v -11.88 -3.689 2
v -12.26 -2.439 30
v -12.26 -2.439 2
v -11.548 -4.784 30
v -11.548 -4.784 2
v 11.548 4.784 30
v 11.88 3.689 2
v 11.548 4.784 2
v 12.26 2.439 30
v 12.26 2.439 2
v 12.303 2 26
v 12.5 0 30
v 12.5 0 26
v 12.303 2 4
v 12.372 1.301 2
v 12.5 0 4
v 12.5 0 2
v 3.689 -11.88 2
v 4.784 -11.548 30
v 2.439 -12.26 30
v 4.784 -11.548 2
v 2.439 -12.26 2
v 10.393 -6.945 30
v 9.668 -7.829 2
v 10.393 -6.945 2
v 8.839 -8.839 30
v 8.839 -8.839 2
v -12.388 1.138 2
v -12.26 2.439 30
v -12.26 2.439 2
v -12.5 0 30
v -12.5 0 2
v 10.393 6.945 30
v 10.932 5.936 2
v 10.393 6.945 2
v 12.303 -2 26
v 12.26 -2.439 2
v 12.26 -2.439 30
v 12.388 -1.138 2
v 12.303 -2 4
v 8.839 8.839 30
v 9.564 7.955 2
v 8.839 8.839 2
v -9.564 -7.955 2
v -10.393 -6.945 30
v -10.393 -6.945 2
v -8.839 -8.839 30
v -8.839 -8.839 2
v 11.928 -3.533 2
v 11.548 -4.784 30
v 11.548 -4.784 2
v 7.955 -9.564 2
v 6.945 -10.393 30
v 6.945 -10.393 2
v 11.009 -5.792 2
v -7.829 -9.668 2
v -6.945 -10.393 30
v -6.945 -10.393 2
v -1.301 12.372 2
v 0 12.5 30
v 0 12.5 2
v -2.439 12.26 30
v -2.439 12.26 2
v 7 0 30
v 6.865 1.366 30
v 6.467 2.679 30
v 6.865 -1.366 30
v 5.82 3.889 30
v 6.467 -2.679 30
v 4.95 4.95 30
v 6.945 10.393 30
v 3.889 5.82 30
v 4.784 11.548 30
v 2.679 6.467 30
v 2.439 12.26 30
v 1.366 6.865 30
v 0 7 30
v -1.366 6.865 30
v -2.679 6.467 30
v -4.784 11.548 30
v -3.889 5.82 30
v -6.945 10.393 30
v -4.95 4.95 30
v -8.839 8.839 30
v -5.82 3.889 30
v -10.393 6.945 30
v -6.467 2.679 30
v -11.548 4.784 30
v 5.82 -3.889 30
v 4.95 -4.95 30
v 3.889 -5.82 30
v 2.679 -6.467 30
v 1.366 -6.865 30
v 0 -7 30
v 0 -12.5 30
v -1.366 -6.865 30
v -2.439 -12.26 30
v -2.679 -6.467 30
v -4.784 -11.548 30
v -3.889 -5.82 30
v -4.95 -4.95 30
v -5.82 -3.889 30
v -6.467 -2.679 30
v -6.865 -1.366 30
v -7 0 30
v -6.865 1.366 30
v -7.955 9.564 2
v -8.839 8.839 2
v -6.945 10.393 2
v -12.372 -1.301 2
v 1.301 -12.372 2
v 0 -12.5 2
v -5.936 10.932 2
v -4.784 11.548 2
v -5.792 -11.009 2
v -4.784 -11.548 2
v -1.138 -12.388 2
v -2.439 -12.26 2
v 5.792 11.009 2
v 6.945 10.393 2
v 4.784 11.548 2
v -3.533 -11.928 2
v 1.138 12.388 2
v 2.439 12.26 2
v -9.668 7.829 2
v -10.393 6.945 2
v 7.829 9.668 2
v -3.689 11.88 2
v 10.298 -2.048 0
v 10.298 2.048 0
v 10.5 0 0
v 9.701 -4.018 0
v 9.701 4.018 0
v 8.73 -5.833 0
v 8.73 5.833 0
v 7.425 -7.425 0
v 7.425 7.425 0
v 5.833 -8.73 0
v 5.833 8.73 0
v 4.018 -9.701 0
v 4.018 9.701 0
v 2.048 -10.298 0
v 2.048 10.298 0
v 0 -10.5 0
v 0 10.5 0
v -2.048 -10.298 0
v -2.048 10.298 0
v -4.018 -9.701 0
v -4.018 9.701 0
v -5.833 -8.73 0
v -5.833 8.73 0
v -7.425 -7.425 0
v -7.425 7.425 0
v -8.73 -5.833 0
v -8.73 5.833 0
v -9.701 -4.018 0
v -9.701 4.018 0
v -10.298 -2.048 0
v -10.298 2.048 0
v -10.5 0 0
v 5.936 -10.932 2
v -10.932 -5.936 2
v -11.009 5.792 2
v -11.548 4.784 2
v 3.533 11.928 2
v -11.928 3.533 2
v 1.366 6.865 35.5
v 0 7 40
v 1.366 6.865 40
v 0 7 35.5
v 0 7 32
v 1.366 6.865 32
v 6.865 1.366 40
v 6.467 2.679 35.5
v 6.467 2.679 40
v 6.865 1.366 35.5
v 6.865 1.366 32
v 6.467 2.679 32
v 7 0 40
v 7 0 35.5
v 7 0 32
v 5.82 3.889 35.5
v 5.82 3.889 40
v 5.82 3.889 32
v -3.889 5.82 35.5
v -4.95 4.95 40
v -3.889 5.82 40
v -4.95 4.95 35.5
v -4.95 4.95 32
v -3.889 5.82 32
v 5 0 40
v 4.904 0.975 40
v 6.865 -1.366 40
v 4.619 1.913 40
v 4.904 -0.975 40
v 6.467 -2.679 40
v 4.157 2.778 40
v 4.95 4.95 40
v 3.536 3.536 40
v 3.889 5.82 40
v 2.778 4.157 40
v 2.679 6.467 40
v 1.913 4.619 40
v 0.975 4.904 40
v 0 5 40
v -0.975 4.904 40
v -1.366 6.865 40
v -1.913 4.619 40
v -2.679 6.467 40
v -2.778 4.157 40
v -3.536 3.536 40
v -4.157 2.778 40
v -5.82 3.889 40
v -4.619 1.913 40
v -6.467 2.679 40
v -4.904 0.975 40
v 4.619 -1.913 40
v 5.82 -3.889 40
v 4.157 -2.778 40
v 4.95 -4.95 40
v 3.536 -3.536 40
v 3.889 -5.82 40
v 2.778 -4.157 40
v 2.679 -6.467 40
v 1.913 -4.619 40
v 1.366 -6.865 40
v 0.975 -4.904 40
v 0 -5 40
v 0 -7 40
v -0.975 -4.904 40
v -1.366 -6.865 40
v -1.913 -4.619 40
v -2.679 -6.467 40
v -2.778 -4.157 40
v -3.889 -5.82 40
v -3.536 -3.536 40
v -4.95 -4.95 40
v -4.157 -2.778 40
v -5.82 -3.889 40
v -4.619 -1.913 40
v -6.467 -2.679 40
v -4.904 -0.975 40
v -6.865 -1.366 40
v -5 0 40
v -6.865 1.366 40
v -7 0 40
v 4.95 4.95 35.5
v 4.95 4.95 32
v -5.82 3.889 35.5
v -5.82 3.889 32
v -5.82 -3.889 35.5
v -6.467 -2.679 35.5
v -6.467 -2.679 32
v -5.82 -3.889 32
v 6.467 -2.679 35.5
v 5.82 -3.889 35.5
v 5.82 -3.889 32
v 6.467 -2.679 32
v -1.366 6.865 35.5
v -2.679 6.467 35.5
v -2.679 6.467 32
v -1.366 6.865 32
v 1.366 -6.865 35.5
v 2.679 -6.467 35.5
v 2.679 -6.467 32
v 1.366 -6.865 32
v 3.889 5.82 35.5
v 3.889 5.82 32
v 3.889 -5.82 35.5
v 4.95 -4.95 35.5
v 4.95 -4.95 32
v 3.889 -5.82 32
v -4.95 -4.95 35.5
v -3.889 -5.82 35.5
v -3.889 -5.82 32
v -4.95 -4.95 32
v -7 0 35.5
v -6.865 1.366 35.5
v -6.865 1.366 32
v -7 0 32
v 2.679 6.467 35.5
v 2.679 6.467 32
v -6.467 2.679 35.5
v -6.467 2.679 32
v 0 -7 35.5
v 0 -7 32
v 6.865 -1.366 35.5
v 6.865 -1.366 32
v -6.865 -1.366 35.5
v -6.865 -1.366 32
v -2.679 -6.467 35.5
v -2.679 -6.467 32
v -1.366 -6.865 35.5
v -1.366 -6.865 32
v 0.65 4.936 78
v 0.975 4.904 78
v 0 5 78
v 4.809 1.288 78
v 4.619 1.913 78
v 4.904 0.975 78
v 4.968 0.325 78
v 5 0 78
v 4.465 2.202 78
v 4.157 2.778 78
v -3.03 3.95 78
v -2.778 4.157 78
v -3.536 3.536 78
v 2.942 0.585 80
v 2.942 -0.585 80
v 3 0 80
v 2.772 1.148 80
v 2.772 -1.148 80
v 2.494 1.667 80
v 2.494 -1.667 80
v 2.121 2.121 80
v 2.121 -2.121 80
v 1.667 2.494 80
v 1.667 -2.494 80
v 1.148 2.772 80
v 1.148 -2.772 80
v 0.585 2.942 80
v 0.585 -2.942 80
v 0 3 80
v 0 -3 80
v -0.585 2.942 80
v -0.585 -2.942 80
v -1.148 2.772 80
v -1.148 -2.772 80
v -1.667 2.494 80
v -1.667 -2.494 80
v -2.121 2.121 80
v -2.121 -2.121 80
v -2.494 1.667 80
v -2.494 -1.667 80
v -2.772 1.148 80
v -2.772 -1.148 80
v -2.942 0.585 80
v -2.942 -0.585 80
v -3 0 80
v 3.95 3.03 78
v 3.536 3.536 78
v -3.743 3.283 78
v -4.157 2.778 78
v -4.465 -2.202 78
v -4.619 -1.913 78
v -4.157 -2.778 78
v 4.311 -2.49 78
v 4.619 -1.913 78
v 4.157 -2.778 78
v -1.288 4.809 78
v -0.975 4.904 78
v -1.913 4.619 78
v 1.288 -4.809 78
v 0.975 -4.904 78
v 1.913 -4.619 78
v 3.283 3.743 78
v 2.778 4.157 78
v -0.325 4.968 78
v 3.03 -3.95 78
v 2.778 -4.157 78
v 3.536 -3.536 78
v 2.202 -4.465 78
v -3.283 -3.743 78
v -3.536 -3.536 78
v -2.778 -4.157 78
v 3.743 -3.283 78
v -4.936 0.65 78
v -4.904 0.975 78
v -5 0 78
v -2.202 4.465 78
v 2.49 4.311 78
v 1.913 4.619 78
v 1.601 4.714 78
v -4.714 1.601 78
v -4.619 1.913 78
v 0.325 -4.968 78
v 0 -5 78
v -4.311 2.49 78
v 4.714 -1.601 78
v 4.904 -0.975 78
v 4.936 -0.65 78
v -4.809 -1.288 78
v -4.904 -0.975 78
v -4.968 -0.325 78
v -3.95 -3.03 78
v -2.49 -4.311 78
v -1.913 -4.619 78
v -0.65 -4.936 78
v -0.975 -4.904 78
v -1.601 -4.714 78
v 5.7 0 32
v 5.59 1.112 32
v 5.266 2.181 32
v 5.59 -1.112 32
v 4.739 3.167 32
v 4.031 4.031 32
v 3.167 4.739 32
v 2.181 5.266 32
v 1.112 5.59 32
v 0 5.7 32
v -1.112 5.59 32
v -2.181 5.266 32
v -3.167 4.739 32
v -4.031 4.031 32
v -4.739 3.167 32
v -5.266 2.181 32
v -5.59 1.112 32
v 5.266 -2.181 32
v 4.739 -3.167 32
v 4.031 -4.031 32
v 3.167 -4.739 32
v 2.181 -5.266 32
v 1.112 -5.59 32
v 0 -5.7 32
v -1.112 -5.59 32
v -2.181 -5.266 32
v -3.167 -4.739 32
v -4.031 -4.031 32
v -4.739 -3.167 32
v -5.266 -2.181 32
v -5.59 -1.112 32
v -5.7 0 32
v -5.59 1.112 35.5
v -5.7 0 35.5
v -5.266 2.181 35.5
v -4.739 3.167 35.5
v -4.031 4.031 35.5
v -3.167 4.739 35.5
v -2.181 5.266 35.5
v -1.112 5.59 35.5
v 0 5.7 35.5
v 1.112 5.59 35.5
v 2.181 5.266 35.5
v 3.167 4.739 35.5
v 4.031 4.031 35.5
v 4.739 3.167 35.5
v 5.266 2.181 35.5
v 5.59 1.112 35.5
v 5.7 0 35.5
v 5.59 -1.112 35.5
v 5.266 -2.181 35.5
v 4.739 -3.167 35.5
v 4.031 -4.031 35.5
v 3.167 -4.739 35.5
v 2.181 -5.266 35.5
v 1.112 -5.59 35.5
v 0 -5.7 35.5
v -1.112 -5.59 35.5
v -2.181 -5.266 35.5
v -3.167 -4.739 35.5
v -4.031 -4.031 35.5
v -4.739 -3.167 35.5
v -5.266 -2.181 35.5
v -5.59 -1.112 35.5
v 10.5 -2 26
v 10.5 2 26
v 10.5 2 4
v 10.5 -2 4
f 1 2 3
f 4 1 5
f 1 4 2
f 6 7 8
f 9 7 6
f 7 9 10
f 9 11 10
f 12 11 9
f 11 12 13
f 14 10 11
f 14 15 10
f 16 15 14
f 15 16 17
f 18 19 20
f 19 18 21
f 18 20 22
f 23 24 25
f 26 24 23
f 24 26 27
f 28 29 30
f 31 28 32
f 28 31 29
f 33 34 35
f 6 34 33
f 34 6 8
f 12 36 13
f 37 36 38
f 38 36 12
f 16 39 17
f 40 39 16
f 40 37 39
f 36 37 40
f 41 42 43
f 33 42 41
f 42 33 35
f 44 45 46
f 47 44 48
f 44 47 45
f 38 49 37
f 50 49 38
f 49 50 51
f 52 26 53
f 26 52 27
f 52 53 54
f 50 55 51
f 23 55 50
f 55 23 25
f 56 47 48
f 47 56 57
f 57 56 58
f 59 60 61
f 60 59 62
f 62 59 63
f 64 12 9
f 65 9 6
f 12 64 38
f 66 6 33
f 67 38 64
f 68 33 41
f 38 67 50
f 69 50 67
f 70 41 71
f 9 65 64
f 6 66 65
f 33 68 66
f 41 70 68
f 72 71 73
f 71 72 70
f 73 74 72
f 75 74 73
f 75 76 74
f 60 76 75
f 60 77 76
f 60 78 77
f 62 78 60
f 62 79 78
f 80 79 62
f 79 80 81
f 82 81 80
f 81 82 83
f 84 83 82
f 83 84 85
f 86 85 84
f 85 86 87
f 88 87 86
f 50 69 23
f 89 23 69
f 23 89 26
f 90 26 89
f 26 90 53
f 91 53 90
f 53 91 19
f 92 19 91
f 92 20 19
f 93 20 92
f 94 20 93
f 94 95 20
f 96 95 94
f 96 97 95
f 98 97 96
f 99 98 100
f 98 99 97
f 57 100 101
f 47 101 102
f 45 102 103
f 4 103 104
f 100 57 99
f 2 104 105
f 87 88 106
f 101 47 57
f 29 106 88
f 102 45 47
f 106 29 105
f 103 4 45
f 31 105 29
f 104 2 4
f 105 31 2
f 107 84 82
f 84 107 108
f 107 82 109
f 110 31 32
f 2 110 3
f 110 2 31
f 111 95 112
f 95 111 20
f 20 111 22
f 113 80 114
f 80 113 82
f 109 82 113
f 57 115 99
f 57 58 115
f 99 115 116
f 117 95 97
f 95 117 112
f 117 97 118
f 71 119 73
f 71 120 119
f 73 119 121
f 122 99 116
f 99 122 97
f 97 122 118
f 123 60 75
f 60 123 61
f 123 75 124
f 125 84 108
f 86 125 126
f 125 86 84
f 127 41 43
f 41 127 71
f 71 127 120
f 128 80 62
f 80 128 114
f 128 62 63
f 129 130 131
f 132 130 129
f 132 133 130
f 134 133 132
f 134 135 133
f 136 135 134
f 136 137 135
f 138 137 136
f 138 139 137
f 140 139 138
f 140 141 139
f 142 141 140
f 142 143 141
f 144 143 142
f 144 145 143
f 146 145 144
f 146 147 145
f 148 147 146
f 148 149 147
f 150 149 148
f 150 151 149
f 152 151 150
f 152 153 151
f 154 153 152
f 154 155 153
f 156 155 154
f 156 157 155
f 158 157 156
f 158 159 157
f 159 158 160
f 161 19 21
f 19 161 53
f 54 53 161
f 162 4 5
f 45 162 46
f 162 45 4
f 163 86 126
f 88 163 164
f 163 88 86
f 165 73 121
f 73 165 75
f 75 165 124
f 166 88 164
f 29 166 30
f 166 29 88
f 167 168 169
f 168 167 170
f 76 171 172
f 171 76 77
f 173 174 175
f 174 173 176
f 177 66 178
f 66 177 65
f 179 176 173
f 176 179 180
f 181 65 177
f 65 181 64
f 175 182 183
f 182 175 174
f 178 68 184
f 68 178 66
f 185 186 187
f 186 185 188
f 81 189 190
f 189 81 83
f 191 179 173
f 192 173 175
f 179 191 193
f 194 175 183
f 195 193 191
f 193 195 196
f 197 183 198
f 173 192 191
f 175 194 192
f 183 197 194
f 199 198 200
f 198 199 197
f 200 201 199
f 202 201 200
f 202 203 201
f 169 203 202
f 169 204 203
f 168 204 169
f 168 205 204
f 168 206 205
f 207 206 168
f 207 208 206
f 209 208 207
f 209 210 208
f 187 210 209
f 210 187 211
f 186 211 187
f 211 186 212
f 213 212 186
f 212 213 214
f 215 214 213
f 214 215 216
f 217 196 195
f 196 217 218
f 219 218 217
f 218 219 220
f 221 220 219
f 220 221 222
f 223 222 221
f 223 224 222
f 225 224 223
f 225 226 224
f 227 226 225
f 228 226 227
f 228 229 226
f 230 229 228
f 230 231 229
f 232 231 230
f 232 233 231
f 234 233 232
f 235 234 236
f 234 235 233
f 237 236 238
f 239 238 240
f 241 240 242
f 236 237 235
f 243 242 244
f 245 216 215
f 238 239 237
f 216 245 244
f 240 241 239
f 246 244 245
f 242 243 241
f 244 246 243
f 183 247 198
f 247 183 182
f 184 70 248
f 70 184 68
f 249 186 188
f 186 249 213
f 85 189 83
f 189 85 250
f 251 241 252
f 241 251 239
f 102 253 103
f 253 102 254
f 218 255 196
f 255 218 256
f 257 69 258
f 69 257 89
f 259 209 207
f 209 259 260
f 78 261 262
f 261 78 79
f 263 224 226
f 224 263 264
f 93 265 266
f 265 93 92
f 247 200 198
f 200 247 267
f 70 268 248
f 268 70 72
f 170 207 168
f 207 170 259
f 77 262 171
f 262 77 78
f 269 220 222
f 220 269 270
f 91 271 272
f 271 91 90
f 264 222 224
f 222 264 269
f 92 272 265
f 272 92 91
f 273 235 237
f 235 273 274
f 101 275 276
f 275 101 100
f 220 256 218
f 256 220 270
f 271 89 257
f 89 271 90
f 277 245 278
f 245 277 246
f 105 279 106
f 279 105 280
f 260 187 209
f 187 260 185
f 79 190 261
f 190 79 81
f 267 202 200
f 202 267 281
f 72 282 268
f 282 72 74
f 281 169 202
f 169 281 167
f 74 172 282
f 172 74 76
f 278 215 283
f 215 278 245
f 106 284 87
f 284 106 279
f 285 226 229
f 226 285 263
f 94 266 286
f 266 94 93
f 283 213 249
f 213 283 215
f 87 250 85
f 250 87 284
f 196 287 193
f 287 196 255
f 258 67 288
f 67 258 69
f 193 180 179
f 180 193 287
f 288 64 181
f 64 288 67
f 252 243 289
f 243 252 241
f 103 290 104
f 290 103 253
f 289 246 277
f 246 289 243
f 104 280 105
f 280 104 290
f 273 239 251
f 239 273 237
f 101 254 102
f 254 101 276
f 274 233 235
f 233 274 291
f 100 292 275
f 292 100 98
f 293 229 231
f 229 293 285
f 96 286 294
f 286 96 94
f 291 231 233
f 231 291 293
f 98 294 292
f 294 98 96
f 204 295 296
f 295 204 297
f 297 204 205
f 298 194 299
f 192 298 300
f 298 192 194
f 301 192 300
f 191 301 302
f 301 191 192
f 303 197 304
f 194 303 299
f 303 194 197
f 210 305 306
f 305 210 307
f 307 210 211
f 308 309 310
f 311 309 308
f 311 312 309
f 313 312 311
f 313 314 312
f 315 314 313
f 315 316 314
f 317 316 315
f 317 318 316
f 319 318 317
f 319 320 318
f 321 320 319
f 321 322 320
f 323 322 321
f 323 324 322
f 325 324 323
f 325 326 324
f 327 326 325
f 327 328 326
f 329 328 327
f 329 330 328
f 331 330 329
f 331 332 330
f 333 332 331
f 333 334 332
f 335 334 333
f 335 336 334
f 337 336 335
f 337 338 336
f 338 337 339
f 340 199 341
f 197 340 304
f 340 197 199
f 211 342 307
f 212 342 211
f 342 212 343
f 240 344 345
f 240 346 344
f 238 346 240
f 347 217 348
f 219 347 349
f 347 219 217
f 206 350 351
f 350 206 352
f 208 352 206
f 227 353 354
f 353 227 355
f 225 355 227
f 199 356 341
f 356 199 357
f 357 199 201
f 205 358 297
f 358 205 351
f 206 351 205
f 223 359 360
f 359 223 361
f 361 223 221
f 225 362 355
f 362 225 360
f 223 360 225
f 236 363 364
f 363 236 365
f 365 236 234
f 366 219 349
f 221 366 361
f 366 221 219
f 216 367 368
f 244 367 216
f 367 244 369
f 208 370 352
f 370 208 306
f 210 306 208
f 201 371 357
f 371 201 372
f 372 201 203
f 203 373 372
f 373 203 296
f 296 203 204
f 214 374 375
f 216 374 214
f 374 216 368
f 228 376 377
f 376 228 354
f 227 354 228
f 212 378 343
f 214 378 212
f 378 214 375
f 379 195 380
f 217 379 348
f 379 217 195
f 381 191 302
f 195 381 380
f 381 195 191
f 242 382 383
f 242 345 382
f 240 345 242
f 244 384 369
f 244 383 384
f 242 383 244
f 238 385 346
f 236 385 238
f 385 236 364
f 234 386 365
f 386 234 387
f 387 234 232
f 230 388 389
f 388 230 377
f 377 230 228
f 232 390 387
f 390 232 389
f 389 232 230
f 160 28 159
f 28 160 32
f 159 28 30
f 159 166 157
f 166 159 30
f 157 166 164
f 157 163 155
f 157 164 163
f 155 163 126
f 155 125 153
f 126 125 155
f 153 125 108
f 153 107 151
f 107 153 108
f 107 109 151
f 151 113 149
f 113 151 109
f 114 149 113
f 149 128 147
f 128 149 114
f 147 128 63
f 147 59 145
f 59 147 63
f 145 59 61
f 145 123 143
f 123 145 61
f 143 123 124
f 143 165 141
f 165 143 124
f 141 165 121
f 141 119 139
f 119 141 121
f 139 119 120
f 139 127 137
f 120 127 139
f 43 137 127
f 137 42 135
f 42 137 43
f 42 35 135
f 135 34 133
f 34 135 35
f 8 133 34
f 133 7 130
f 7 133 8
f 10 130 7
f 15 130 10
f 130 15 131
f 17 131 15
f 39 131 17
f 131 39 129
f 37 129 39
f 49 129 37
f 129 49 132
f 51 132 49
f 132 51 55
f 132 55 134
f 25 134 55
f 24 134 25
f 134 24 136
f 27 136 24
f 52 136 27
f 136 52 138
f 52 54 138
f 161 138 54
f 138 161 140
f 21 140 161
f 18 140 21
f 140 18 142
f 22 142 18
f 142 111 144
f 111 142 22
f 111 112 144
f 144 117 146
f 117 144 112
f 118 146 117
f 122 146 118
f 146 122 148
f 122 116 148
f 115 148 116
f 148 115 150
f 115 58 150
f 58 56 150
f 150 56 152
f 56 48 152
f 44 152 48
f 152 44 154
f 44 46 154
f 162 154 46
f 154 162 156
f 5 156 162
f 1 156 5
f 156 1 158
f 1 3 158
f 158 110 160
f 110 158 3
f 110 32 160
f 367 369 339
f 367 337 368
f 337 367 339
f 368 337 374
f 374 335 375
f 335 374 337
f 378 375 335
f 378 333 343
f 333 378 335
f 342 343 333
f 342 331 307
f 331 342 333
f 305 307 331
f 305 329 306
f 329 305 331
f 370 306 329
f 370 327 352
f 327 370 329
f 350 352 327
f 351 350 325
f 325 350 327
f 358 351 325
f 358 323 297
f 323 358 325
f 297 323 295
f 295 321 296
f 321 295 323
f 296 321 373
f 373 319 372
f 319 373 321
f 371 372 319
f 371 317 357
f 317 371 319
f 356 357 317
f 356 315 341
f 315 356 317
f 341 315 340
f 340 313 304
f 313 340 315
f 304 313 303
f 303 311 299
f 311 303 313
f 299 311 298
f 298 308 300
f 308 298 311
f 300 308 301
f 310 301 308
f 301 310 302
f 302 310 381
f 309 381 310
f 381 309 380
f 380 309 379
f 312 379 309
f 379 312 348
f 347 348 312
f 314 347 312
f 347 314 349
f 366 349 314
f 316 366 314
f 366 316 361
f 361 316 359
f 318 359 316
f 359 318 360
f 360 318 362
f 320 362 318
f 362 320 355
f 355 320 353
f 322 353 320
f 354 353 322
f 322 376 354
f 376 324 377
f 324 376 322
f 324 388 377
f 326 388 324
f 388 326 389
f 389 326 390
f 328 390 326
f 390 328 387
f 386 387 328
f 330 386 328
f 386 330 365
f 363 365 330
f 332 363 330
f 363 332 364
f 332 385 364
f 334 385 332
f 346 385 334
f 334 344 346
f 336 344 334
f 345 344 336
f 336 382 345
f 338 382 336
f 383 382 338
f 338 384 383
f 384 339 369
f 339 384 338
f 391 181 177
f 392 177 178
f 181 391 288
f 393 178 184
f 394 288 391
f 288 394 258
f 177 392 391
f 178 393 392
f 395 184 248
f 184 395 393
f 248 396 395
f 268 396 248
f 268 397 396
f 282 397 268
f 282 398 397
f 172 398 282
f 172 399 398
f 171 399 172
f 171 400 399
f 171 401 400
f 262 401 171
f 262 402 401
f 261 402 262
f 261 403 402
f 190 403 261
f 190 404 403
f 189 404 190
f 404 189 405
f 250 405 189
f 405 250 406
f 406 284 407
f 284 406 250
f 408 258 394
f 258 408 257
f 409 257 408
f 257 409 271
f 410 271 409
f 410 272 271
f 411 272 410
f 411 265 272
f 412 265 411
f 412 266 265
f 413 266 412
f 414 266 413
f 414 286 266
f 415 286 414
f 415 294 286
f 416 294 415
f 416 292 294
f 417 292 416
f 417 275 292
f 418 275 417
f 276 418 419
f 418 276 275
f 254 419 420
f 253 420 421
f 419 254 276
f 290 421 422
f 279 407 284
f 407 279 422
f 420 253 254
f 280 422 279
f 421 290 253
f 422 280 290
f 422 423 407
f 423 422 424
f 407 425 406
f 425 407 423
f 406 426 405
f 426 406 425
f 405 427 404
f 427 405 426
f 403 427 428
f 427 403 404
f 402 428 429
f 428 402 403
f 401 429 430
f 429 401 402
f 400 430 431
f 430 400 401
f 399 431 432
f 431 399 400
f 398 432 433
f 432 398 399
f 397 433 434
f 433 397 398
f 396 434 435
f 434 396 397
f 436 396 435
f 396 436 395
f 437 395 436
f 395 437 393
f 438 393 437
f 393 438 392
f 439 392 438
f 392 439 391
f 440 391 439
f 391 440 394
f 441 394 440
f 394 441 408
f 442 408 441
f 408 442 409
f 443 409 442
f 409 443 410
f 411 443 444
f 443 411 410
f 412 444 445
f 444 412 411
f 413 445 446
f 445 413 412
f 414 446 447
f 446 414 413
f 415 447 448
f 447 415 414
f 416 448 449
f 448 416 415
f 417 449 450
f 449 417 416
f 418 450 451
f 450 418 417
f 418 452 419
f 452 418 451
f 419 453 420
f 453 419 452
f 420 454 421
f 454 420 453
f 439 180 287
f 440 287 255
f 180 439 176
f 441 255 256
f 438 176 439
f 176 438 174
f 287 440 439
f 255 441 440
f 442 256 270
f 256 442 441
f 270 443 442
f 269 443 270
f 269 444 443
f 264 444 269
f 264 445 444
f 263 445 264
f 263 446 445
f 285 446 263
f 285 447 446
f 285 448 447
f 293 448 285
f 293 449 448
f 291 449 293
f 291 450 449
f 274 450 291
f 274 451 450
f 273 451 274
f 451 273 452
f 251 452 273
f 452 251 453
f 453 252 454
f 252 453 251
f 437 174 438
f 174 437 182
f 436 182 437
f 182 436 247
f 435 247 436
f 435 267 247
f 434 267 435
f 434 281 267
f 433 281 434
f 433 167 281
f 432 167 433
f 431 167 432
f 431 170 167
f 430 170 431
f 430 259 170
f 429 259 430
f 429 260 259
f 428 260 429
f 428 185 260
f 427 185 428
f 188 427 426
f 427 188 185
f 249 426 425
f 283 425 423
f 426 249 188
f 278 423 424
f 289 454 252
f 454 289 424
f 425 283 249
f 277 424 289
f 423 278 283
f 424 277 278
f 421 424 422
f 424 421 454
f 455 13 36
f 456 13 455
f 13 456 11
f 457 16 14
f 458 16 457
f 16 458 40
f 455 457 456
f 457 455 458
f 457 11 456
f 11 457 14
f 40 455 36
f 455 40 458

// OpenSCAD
$fn = 32;

// ----------------------------------------------------------------------
// Stepped shaft: diameters 25, 14, 10 mm, 80 mm long
// ----------------------------------------------------------------------

// --- parameters (mm) ---
d1 = 25;                  // step 1 diameter
len1 = 30;                // step 1 length
d2 = 14;                  // step 2 diameter
len2 = 10;                // step 2 length
d3 = 10;                  // step 3 diameter
len3 = 40;                // step 3 length
total = 80;               // overall length
chamfer = 2;              // end chamfer
groove_r = 7;             // groove radius
groove_z = 32;            // groove position from the end
groove_w = 3.5;           // groove width
groove_d = 1.3;           // groove depth
key_w = 4;                // keyway width
key_d = 2;                // keyway depth
key_len = 22;             // keyway length
key_z = 4;                // keyway start along the shaft

difference() {
  /* turned body: stacked cylinders, every step sunk into the bigger one */
  union() {
    cylinder(h = len1, d = d1);
    translate([0, 0, 29.6]) cylinder(h = 10.4, d = d2);
    translate([0, 0, 39.6]) cylinder(h = 40.4, d = d3);
  }
  /* bottom chamfer ring cut */
  rotate_extrude() translate([10.5, -2.5]) polygon([[0, 0], [4.5, 0], [4.5, 7], [0, 2.5]]);
  /* top chamfer ring cut */
  rotate_extrude() translate([3, 80]) polygon([[0, 0], [4.5, -4.5], [4.5, 2.5], [0, 2.5]]);
  /* circlip groove just behind the shoulder */
  rotate_extrude() translate([groove_r - groove_d, groove_z]) square([groove_d + 2.5, groove_w]);
  /* keyway milled along the first step */
  translate([d1 / 2 - key_d, -key_w / 2, key_z]) cube([key_d + 2.5, key_w, key_len]);
}
